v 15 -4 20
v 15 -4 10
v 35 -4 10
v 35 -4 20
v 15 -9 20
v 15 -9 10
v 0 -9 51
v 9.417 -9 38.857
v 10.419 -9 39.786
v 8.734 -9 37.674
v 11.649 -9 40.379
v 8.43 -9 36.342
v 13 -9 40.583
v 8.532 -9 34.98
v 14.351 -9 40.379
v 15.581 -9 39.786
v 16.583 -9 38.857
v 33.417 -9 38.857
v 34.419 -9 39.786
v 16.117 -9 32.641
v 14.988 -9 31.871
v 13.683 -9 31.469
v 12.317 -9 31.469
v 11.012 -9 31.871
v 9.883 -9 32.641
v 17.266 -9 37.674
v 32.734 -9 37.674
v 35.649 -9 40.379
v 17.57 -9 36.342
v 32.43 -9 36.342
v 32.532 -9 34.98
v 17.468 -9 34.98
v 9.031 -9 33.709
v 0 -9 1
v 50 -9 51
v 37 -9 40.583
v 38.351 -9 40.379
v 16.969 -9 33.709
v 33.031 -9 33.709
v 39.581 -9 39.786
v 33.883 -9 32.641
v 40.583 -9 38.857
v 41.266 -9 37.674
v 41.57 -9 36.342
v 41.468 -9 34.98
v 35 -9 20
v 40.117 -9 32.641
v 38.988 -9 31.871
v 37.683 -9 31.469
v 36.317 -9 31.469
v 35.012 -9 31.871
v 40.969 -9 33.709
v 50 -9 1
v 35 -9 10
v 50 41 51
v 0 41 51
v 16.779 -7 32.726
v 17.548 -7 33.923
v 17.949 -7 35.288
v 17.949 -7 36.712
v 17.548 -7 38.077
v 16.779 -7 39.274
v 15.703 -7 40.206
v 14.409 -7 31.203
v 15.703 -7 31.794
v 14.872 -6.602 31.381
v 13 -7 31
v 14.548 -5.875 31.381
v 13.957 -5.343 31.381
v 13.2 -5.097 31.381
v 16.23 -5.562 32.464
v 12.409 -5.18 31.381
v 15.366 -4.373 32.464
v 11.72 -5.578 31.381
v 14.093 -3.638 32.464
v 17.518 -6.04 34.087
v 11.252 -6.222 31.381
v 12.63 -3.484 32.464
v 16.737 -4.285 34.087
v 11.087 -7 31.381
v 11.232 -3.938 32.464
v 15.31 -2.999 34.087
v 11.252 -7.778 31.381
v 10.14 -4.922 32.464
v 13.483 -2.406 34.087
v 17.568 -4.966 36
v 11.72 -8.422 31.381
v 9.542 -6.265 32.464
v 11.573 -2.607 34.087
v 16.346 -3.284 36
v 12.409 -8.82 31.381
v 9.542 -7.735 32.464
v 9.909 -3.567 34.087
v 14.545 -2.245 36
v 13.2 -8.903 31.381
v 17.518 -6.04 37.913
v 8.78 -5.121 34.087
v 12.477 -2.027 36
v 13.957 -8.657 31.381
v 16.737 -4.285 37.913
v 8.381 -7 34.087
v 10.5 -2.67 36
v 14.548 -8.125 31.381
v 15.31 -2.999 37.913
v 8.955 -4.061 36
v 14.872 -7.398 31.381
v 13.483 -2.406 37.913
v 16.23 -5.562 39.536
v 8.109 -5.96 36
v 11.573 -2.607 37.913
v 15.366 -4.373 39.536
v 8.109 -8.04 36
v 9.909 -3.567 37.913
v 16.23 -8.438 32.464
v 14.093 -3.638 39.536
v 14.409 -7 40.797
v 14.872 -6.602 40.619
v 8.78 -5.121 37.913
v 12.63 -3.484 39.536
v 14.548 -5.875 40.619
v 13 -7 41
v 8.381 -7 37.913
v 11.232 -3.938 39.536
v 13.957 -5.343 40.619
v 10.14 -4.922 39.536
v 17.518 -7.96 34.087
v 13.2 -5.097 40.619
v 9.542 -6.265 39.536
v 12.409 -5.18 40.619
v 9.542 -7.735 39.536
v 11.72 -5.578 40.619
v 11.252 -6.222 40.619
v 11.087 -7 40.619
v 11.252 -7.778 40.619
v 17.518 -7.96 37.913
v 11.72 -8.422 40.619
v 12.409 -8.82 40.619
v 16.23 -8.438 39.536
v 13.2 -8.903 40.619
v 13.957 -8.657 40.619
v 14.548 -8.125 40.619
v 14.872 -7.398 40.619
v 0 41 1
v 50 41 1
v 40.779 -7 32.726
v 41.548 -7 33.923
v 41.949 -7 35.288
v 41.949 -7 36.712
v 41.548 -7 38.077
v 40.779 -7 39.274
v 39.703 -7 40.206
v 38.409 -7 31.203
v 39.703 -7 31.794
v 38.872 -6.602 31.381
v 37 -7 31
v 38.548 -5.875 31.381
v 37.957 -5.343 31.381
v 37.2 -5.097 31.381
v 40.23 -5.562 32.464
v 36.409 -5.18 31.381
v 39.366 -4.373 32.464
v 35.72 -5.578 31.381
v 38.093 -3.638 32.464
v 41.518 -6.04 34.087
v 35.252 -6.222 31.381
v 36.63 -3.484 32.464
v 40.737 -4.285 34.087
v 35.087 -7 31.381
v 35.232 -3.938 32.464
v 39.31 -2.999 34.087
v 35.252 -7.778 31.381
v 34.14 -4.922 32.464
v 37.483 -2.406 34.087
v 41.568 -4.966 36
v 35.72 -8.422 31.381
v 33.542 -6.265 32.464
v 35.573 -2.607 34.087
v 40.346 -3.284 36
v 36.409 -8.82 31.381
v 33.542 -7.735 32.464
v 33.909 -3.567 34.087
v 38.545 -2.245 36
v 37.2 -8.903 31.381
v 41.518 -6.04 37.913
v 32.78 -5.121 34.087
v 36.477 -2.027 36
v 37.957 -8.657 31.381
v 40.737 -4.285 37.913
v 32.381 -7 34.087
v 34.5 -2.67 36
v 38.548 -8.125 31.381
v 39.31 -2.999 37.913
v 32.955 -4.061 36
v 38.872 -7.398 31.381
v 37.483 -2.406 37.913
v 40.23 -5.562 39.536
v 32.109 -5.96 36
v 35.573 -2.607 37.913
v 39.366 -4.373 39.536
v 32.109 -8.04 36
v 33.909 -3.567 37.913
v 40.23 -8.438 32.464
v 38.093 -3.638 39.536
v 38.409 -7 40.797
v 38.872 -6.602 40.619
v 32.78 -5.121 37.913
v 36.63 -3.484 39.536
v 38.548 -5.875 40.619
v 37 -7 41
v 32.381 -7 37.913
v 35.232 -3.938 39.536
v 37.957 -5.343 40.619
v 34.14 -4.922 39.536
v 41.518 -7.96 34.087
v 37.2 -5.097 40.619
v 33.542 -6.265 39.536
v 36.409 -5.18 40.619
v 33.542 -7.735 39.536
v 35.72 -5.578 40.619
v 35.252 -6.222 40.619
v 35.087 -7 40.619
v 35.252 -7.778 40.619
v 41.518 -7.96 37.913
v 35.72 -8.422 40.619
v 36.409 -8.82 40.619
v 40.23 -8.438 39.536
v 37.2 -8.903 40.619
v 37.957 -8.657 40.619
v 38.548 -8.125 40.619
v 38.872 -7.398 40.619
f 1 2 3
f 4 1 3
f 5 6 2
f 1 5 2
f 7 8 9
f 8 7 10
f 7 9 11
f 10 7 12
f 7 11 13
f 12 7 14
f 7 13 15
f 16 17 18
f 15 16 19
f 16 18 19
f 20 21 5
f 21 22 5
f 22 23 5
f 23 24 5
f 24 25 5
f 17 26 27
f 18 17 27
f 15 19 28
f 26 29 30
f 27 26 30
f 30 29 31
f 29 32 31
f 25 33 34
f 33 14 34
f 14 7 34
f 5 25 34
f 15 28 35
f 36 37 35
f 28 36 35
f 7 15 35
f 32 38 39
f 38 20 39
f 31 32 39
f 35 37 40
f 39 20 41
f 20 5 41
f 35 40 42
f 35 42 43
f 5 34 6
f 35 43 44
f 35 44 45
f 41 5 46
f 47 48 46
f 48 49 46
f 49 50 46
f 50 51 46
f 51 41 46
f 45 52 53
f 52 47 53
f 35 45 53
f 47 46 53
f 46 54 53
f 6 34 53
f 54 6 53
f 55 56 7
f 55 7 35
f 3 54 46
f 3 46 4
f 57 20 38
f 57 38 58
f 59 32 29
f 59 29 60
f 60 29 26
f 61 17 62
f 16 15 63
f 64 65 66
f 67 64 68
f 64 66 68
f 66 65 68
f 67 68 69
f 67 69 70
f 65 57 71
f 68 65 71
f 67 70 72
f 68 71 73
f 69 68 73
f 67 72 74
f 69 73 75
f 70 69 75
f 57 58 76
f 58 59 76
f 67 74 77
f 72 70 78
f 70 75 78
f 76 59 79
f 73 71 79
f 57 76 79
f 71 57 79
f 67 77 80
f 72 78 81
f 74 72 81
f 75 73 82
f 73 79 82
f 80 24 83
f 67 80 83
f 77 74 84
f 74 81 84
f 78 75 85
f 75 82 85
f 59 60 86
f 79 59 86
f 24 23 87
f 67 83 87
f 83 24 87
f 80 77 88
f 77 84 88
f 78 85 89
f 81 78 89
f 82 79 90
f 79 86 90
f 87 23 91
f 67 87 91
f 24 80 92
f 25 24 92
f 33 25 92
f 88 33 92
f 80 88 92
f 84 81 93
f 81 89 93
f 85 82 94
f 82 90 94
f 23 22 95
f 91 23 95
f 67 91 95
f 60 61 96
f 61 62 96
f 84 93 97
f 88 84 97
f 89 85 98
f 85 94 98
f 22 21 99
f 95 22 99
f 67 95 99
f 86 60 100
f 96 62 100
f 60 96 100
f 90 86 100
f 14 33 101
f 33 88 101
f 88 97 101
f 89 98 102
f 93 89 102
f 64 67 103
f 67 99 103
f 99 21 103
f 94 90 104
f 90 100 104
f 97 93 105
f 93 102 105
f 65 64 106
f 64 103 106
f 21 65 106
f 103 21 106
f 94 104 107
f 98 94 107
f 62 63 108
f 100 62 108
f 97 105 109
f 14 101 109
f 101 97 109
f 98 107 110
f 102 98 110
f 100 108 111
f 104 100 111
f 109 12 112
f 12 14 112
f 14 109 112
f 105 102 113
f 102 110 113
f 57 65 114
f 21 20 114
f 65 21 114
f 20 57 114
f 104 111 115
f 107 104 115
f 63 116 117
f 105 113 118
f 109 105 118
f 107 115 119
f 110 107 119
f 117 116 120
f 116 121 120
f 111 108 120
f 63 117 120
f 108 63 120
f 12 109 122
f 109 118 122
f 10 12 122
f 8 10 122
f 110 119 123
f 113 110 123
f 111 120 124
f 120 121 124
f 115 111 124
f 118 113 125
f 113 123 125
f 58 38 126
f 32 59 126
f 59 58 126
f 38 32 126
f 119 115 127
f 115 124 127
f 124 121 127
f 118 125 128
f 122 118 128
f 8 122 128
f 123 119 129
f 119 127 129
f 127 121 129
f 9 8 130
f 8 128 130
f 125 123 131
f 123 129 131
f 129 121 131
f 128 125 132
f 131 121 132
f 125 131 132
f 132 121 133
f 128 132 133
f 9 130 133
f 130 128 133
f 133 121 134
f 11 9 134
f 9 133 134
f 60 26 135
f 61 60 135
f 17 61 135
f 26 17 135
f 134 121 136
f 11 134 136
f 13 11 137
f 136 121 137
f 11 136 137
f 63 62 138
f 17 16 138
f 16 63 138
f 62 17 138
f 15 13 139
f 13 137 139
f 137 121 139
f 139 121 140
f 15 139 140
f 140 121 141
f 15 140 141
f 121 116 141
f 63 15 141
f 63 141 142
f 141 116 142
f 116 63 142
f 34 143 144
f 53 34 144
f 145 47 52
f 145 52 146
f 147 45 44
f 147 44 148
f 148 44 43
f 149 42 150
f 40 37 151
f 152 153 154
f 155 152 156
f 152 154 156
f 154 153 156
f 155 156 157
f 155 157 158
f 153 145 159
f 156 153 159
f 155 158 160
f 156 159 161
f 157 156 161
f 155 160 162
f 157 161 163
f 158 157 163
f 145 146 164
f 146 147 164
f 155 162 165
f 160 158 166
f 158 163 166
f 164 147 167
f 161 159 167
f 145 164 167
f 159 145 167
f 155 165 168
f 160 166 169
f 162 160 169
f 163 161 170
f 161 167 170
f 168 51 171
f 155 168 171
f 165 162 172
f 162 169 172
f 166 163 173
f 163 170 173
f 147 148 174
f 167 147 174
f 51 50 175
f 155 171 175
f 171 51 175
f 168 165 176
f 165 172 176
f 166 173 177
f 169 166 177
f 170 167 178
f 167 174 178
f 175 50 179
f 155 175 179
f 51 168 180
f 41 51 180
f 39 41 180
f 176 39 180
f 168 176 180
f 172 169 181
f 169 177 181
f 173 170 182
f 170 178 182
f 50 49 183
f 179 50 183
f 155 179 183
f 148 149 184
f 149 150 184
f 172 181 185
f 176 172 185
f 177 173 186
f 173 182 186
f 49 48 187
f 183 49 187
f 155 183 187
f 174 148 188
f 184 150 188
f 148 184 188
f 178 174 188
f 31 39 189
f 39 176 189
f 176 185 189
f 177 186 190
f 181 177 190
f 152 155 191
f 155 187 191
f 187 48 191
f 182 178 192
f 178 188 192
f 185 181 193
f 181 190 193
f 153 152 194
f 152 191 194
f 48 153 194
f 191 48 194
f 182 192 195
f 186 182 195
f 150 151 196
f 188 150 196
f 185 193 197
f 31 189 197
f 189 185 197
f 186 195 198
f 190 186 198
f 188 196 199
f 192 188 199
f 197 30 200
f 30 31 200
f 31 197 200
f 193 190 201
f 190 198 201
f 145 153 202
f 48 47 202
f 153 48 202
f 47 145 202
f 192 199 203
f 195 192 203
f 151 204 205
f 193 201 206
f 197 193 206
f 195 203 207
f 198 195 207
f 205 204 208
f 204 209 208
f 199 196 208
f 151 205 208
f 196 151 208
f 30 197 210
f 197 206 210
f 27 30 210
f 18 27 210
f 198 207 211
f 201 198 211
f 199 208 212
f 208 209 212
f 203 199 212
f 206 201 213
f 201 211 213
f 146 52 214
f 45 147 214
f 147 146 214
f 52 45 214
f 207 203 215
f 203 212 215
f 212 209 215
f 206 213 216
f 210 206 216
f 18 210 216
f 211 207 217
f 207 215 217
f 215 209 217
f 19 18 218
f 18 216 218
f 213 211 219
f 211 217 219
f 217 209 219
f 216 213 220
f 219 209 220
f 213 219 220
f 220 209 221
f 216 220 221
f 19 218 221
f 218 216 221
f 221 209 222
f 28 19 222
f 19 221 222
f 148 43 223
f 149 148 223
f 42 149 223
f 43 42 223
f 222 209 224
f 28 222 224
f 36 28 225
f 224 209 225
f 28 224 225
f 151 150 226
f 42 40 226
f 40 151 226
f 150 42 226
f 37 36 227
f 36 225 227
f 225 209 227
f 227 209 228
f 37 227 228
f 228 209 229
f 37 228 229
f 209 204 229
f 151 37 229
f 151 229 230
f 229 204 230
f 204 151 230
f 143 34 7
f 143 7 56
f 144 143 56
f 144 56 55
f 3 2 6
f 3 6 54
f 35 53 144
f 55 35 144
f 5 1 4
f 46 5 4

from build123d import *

# Parameters (mm, degrees)
BOX072_W     = 20
BOX072_H     = 10
BOX072_DEPTH = 10
BOX071_W     = 50
BOX071_H     = 50
BOX071_DEPTH = 50


with BuildPart() as cubo001:
    # Box072 → Box072 (new body)
    with BuildSketch(Plane(origin=(15, -5, 9), x_dir=(1, 0, 0), z_dir=(0, 0, 1))):
        with Locations((10, 5)):
            Rectangle(BOX072_W, BOX072_H)
    extrude(amount=BOX072_DEPTH)


with BuildPart() as esfera001:
    # Sphere001 → Sphere001 (revolve)
    with BuildSketch(Plane(origin=(37, 2, 35), x_dir=(1, 0, 0), z_dir=(0, -1, 0))):
        with BuildLine():
            ThreePointArc((0, -5), (5, 0), (0, 5))
            Line((0, 5), (0, -5))
        make_face()
    revolve(axis=Axis((37, 2, 35), (0, 0, 1)))


with BuildPart() as esfera:
    # Sphere → Sphere (revolve)
    with BuildSketch(Plane(origin=(13, 2, 35), x_dir=(1, 0, 0), z_dir=(0, -1, 0))):
        with BuildLine():
            ThreePointArc((0, -5), (5, 0), (0, 5))
            Line((0, 5), (0, -5))
        make_face()
    revolve(axis=Axis((13, 2, 35), (0, 0, 1)))


with BuildPart() as cut117:
    # Box071 → Box071 (new body)
    with BuildSketch(Plane.XY):
        with Locations((25, 25)):
            Rectangle(BOX071_W, BOX071_H)
    extrude(amount=BOX071_DEPTH)

    # Cut115: cut Esfera
    add(esfera.part, mode=Mode.SUBTRACT)

    # Cut116: cut Esfera001
    add(esfera001.part, mode=Mode.SUBTRACT)

    # Cut117: cut Cubo001
    add(cubo001.part, mode=Mode.SUBTRACT)


with BuildPart() as cut117_1:
    # Cut117 placement: moved
    add(cut117.part.moved(Location((0, -9, 1))))


solid = cut117_1.part
